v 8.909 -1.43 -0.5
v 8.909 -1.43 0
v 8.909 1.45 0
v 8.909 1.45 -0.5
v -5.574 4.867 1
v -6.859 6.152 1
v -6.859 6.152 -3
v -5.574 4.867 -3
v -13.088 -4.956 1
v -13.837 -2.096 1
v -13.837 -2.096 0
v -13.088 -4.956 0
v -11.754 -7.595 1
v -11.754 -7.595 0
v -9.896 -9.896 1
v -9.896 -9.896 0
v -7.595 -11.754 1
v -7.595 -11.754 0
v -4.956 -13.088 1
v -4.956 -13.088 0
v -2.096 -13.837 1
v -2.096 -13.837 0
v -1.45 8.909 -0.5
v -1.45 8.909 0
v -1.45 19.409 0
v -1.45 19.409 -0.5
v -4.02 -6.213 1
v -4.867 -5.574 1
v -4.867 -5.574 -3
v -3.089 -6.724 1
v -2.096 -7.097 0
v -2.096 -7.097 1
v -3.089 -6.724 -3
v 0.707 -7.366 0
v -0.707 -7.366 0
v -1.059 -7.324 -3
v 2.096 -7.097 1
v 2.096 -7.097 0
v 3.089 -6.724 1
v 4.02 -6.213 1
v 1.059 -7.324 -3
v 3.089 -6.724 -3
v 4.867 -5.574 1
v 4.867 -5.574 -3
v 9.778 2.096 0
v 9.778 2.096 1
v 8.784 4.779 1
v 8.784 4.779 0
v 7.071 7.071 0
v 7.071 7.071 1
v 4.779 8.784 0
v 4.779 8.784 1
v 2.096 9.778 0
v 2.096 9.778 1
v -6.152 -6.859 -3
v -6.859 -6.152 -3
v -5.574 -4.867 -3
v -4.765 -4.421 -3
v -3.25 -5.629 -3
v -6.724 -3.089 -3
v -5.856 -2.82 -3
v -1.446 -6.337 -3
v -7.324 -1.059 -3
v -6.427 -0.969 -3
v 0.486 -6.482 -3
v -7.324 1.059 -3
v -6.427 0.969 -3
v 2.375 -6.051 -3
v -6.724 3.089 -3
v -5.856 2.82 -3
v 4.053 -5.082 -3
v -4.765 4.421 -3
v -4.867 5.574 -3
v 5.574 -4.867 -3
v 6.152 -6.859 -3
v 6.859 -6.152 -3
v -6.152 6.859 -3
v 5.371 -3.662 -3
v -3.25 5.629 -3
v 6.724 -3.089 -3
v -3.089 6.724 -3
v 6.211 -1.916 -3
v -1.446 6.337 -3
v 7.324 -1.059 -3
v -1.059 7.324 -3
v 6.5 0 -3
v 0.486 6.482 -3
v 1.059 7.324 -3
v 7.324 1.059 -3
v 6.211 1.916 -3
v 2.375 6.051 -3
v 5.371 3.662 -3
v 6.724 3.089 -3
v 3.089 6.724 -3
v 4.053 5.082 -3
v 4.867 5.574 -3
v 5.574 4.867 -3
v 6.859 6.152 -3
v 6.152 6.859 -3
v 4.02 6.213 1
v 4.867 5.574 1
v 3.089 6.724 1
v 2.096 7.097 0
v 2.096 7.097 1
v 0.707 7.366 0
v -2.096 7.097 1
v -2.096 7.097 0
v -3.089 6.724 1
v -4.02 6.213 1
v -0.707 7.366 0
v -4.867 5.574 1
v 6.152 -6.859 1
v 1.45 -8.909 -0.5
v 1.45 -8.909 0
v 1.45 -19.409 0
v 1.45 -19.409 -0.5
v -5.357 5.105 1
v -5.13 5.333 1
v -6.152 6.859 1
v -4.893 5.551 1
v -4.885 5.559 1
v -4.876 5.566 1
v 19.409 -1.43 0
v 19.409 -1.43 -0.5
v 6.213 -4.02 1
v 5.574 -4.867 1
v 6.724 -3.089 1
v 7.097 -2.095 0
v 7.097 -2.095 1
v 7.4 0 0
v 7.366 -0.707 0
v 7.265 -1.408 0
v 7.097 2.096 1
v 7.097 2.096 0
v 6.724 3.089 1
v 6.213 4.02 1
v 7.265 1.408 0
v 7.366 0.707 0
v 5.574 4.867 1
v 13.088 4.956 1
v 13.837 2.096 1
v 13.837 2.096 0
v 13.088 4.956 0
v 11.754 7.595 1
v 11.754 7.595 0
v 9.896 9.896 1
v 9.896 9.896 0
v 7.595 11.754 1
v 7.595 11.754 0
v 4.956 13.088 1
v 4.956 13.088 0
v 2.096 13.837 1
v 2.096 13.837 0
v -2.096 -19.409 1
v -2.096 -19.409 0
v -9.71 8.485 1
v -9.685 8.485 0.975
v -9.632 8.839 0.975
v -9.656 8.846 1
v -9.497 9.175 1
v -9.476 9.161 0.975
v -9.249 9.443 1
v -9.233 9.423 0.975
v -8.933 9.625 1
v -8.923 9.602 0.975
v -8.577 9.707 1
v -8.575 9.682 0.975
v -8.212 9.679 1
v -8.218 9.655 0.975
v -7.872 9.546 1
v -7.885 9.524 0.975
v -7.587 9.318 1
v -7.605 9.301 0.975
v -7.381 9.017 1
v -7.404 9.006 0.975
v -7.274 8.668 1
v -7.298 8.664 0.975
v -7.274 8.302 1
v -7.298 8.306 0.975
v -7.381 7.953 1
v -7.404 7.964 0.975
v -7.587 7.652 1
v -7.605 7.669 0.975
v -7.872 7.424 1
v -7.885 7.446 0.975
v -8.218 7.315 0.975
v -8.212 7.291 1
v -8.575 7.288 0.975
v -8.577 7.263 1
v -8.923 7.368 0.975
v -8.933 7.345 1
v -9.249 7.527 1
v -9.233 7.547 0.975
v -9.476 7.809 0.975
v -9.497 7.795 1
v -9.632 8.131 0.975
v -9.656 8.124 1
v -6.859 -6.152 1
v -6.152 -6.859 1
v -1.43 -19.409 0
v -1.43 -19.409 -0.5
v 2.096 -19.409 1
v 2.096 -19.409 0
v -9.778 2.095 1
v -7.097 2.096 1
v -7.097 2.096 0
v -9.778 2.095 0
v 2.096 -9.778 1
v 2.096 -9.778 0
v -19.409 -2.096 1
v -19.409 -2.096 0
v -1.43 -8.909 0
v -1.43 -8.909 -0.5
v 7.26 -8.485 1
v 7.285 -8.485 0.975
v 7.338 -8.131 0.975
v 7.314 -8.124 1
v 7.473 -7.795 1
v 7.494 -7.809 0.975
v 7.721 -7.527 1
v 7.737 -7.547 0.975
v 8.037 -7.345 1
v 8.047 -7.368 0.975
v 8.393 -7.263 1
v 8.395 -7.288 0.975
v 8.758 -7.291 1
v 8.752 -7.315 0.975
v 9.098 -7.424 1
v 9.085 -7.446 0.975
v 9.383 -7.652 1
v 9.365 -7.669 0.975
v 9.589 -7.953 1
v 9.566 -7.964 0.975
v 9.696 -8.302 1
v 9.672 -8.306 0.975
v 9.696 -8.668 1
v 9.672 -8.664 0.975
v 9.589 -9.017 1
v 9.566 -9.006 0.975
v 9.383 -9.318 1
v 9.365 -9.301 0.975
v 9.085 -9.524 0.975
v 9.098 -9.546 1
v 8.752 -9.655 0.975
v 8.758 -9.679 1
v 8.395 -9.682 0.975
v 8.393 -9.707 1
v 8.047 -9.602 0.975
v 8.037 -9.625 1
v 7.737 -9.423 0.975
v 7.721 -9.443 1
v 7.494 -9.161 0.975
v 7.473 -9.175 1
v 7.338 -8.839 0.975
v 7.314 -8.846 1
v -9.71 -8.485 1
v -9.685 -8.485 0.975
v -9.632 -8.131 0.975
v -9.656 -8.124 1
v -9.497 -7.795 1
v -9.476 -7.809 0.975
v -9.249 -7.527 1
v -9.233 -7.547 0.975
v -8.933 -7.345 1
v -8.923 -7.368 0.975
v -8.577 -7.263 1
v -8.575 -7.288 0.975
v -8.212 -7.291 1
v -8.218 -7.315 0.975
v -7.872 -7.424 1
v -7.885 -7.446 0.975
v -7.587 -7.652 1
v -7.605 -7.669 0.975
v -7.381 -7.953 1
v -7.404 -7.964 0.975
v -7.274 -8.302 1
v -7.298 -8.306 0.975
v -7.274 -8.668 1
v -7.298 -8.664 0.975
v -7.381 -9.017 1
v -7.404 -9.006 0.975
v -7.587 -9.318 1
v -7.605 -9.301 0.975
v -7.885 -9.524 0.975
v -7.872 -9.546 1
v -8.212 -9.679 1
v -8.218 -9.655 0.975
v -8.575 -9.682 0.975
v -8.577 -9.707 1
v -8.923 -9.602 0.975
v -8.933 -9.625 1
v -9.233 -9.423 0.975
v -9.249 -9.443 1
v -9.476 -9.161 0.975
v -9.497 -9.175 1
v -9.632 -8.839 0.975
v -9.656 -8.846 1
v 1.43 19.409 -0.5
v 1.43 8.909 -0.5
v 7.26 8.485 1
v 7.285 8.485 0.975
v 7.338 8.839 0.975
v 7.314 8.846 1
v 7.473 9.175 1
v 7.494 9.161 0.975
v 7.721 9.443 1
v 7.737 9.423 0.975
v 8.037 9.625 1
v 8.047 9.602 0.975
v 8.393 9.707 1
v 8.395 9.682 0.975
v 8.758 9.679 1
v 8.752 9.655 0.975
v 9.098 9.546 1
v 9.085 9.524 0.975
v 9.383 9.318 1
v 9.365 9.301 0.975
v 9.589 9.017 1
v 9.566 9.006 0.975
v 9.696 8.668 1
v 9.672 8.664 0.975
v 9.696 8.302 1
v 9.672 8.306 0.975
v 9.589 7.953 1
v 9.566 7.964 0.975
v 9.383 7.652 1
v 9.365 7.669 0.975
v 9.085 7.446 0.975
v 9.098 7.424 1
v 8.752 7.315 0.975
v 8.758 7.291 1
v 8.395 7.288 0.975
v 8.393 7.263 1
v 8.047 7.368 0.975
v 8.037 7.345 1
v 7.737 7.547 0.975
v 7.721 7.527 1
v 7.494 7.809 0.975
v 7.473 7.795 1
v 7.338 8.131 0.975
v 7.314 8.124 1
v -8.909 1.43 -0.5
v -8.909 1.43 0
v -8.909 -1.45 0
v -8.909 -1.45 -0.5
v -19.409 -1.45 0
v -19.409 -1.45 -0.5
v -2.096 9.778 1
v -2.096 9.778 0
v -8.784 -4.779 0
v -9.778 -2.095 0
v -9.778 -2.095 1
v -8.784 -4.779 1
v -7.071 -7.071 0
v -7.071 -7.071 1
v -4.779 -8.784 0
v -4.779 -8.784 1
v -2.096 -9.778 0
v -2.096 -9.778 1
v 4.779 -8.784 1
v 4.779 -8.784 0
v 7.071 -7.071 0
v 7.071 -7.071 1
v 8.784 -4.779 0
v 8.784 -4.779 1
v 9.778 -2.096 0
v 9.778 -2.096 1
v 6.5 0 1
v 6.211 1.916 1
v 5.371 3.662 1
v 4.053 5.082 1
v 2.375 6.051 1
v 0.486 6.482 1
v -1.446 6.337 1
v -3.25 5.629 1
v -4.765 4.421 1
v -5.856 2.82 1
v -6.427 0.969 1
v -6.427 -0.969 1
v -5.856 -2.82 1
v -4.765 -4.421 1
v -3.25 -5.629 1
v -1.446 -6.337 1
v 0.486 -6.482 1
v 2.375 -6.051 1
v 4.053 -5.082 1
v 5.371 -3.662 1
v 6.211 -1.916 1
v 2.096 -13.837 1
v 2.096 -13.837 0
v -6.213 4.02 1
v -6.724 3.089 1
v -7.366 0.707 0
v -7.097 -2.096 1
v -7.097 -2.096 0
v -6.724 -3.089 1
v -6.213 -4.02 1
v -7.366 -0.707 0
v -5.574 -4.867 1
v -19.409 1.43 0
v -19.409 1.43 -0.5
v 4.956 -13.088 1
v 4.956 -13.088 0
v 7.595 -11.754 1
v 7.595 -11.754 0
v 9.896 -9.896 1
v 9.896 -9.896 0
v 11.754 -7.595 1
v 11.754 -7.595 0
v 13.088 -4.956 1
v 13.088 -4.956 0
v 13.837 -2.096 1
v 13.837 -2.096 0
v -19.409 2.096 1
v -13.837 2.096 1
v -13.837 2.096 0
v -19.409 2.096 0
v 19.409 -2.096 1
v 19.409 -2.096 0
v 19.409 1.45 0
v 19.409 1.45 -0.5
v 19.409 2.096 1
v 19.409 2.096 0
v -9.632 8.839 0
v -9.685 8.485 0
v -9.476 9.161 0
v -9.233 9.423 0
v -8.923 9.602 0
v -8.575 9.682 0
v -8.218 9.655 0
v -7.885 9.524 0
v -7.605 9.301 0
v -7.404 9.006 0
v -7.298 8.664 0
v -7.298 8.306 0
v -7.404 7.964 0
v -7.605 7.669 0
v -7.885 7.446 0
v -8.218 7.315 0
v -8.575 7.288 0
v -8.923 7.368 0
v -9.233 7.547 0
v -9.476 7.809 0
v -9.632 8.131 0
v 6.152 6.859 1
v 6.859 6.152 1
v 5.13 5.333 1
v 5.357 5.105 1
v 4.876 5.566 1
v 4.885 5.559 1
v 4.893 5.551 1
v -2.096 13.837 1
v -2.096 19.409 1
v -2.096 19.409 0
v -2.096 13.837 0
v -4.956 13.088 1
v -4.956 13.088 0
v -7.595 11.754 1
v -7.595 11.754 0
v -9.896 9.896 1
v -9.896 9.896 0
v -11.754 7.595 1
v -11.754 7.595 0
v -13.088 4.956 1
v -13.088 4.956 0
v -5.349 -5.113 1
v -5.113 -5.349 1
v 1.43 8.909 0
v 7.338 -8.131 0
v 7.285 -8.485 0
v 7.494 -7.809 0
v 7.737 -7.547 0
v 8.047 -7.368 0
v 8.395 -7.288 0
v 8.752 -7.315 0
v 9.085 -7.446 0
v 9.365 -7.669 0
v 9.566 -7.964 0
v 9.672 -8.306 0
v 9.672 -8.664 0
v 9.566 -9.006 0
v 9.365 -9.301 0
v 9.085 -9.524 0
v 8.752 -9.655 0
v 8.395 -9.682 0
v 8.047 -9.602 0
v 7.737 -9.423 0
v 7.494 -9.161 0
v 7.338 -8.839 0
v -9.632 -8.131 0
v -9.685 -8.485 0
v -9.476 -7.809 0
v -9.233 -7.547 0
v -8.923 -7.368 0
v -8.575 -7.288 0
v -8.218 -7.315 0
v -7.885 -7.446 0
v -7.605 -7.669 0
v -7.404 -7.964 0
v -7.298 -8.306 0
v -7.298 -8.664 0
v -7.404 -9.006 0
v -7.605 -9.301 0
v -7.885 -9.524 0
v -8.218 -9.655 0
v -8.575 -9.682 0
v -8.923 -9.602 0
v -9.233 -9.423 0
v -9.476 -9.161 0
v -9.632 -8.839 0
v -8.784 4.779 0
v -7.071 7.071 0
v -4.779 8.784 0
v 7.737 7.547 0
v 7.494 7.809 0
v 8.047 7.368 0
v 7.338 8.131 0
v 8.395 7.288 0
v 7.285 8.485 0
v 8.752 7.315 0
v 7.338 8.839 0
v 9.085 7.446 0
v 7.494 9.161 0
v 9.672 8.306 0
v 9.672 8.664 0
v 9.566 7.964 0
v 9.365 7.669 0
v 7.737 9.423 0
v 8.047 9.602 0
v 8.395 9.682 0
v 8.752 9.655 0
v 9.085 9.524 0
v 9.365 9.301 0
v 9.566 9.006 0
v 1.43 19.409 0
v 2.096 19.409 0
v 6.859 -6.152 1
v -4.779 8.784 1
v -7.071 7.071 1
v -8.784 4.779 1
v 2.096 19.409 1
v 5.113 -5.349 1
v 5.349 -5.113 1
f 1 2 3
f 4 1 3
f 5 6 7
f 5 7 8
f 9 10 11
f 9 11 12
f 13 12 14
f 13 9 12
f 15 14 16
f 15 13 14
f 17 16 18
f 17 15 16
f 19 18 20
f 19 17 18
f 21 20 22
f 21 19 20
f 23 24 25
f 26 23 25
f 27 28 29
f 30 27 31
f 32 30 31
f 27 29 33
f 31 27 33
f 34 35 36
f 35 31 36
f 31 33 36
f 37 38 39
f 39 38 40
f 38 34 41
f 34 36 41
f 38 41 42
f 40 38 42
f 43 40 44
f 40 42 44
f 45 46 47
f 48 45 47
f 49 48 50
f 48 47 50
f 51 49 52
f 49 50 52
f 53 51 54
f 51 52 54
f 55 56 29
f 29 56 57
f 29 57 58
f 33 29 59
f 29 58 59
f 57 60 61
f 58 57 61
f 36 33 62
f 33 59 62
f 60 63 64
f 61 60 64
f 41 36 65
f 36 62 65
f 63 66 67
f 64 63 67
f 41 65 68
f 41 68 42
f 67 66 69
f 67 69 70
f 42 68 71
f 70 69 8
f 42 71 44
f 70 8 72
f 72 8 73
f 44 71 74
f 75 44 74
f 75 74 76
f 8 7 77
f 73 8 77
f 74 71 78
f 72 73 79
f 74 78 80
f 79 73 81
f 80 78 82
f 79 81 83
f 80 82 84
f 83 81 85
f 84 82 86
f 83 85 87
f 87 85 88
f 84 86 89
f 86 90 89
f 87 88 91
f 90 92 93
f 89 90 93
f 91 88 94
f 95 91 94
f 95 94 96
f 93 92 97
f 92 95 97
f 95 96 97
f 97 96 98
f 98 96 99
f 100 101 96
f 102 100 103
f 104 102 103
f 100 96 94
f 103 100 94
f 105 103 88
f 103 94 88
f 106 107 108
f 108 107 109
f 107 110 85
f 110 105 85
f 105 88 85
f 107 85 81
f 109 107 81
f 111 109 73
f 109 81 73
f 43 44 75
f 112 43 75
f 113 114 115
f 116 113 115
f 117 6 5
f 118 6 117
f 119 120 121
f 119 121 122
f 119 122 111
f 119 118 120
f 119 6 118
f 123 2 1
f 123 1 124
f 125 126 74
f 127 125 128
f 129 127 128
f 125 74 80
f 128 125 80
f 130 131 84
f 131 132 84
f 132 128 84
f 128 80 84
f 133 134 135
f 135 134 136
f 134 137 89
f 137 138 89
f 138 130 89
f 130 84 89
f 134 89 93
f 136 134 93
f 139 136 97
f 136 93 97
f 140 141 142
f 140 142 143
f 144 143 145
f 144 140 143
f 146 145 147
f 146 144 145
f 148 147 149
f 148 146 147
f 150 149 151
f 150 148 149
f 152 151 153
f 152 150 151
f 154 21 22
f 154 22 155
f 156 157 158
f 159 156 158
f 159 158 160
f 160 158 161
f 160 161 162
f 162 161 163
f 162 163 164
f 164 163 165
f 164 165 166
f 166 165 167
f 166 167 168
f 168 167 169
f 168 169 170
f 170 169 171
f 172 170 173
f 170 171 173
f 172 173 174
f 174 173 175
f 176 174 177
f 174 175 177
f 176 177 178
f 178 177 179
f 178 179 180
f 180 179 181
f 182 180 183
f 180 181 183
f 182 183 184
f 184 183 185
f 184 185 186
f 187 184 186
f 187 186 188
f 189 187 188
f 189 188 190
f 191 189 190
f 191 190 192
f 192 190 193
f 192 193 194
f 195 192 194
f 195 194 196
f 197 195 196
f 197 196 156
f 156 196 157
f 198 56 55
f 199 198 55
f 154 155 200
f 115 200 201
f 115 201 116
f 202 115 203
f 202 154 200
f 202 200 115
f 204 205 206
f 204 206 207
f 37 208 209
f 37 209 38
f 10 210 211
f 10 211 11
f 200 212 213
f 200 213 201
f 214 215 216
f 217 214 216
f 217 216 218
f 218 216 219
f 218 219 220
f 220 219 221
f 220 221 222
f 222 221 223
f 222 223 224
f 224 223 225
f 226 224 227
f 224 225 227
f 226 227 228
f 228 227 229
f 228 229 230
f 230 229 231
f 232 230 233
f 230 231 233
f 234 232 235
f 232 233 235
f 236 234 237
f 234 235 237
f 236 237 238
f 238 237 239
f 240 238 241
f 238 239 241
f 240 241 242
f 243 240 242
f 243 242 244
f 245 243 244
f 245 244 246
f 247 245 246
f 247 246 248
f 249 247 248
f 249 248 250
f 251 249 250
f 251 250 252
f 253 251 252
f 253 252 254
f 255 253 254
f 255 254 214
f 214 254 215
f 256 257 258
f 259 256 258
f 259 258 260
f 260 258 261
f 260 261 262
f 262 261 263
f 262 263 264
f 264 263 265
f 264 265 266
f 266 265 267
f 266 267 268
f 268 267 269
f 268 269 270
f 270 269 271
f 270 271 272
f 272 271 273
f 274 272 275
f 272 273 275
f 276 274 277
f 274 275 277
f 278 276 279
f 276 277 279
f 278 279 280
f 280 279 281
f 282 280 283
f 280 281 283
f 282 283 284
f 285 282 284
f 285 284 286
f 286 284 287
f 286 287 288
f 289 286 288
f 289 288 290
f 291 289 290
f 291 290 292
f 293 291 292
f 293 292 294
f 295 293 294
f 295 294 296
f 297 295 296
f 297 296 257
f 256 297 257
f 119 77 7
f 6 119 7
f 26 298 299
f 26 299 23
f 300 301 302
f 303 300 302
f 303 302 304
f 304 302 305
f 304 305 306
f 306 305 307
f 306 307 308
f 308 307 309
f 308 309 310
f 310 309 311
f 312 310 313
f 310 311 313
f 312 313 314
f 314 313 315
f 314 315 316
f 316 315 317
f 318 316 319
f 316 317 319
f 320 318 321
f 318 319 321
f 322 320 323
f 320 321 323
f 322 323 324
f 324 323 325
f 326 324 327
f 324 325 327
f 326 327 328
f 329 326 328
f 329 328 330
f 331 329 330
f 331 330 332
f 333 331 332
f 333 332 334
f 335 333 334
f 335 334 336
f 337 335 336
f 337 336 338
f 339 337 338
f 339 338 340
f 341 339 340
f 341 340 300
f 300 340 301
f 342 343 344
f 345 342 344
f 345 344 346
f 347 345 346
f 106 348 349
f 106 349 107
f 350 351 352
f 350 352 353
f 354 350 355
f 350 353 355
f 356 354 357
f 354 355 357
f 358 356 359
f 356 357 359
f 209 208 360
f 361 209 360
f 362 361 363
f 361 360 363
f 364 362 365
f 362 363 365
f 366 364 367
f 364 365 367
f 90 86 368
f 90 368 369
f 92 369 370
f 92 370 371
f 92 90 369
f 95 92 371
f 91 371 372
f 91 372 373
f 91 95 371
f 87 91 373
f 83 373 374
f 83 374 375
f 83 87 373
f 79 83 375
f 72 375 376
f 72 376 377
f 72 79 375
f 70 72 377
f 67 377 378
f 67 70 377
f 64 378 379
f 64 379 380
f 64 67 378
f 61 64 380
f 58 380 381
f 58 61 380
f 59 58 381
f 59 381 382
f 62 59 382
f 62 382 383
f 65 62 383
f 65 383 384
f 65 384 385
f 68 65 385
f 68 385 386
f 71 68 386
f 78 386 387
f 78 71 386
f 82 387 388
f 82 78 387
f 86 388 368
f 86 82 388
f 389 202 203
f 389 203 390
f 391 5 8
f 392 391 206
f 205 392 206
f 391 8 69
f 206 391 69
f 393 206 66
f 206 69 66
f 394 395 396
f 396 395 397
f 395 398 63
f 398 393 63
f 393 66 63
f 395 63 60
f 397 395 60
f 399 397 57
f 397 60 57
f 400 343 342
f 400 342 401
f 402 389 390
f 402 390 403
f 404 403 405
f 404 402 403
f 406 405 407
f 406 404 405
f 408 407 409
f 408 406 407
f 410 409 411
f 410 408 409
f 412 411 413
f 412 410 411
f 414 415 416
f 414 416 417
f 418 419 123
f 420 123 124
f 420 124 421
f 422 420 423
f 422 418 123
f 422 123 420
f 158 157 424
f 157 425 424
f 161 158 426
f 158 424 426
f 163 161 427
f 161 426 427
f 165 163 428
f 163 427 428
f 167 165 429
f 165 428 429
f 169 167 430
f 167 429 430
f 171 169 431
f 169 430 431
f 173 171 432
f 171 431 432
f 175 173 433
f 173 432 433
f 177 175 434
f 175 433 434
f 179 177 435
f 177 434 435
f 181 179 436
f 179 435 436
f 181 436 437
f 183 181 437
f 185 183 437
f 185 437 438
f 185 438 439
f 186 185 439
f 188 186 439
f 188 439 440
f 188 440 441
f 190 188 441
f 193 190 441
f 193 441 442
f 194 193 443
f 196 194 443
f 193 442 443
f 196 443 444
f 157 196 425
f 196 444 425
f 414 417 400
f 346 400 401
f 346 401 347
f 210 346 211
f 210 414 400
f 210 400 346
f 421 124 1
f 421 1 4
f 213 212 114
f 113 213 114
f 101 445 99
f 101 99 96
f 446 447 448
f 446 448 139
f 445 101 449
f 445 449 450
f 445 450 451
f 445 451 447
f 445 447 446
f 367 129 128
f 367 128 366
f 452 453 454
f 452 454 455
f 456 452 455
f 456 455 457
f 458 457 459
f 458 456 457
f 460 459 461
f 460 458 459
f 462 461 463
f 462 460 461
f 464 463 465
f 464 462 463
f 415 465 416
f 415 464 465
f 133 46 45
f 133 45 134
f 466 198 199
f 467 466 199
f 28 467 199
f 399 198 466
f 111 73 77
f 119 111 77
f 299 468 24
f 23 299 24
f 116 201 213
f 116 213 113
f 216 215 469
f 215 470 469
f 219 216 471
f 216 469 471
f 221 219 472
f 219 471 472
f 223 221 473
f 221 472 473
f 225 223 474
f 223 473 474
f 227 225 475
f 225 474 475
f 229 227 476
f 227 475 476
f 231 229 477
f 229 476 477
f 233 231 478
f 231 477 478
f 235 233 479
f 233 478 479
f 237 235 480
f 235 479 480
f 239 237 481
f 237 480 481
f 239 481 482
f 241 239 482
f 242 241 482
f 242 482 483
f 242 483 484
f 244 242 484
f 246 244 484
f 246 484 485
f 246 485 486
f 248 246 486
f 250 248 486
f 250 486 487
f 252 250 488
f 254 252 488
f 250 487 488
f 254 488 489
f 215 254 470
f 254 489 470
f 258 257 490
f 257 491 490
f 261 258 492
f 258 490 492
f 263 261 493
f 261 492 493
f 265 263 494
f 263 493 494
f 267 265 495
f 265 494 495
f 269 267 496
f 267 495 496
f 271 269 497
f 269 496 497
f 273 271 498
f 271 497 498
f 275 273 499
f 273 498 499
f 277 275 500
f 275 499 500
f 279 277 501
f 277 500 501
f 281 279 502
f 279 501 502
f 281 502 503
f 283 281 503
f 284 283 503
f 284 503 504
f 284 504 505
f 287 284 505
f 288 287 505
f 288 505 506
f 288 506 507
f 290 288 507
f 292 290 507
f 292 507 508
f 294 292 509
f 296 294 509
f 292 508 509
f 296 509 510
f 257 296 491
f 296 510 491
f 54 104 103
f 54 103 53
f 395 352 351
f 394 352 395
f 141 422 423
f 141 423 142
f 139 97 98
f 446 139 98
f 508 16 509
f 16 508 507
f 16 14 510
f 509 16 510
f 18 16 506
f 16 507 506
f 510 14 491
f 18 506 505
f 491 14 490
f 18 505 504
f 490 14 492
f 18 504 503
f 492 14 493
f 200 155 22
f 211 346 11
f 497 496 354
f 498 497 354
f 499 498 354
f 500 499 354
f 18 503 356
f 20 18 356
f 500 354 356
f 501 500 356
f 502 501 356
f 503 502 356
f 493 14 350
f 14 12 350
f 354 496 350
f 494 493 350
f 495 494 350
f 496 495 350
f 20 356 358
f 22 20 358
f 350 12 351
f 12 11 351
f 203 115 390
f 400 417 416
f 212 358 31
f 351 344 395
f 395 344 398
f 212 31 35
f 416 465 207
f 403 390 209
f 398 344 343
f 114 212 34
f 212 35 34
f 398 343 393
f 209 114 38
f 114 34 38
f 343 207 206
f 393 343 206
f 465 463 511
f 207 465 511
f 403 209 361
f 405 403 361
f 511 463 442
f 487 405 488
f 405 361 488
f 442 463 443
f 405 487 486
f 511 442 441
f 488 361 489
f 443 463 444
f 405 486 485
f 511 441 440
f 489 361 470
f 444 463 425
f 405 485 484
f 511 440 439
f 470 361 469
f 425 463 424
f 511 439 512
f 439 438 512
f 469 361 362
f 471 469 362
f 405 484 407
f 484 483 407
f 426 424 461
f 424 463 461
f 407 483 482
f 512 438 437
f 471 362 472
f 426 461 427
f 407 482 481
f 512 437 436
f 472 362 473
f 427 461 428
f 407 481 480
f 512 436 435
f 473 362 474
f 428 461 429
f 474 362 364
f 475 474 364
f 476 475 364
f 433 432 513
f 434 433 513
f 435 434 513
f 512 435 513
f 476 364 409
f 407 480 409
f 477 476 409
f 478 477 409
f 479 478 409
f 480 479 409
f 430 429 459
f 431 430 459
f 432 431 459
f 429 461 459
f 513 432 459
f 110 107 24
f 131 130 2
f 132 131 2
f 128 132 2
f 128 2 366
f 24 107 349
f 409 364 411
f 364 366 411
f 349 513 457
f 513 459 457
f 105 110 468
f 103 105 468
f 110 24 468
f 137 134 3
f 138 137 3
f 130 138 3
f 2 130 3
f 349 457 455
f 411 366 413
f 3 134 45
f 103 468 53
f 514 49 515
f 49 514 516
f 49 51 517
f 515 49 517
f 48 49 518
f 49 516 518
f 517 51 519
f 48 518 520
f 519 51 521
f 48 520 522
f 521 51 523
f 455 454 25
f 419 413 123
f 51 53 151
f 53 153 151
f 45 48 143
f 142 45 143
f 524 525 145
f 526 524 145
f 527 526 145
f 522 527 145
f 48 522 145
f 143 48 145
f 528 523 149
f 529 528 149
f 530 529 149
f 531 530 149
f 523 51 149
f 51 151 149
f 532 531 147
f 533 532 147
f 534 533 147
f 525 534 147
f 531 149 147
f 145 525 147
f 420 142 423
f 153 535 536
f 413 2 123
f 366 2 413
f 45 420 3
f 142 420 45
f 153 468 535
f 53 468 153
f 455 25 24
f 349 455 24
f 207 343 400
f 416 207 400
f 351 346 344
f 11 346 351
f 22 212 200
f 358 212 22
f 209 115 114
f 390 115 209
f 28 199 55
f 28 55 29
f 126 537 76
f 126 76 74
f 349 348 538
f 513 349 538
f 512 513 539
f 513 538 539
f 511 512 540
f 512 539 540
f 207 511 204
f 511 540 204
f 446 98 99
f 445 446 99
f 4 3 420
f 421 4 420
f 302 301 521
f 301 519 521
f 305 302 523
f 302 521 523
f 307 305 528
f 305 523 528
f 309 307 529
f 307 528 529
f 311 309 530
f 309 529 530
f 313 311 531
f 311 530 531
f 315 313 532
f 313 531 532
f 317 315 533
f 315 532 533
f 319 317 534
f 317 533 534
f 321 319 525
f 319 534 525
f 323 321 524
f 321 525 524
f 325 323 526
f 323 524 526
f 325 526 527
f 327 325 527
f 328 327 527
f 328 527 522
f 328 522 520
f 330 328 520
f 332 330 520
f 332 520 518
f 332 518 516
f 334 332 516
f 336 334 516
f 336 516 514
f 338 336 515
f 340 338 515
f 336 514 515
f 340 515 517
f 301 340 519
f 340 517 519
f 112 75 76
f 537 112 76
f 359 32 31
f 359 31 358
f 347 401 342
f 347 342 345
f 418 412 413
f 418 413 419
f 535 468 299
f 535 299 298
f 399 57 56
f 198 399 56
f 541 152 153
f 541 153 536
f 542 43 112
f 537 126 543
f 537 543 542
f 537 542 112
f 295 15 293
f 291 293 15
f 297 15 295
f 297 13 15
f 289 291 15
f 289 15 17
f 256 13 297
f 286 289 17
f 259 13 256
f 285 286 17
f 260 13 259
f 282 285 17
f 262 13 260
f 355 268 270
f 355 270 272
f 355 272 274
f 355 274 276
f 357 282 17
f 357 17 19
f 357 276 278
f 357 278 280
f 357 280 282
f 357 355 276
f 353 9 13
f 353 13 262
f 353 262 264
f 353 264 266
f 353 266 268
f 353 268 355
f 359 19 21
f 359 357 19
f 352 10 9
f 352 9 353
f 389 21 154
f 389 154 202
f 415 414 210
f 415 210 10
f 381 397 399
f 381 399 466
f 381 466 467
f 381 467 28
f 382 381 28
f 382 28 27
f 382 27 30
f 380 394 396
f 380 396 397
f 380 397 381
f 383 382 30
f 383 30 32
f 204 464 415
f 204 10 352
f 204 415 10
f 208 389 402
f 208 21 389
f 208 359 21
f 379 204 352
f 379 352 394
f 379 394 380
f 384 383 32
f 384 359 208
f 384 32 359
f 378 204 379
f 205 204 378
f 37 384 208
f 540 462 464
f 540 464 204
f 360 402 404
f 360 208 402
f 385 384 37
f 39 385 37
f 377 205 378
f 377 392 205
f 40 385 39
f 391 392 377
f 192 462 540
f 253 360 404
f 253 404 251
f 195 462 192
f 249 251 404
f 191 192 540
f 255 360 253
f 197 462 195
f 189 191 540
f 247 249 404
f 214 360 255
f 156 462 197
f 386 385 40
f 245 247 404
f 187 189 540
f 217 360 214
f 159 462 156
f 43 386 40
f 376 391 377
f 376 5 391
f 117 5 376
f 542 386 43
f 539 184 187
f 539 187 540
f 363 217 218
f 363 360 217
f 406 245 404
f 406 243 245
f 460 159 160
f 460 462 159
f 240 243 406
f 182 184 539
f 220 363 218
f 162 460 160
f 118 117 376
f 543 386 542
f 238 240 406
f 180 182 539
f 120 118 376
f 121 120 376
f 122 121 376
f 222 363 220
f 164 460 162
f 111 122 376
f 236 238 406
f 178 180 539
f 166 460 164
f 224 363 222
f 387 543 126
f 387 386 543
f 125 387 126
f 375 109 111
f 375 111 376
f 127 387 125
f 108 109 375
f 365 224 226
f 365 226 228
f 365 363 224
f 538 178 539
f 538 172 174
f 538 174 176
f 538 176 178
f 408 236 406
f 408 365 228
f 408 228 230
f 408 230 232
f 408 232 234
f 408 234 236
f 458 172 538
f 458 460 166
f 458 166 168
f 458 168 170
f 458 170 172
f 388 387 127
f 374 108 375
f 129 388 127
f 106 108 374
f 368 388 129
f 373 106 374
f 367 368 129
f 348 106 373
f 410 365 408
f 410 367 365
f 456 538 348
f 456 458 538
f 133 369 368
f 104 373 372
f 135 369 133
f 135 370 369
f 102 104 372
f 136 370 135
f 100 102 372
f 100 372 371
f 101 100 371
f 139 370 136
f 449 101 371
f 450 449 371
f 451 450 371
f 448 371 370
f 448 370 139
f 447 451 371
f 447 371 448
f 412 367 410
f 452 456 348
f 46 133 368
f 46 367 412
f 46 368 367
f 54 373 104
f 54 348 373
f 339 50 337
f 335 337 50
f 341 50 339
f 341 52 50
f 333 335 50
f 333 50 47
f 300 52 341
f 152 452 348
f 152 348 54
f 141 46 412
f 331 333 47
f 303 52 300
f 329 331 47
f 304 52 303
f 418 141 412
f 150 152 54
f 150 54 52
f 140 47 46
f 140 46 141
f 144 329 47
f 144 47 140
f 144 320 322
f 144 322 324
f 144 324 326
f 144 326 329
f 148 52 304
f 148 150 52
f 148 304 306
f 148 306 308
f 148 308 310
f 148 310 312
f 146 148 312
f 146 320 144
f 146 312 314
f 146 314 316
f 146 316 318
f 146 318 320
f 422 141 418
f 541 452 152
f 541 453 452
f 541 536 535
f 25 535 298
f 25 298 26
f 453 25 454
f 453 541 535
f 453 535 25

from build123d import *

# Parameters (mm, degrees)
BOSS_EXTRUDE1_DEPTH            = 1.0000005
BOSS_EXTRUDE1_DEPTH_BACK       = 3
SKETCH1_R                      = 7.4
SKETCH1_R_2                    = 6.5
BOSS_EXTRUDE2_DEPTH            = 1.0000005
BOSS_EXTRUDE12_START           = -3
BOSS_EXTRUDE12_DEPTH           = 4.000001
SKETCH6_W                      = 2.880295876
SKETCH6_H                      = 10.5
BOSS_EXTRUDE8_DEPTH            = 0.5
CIRPATTERN3_COUNT              = 4
SKETCH7_R                      = 14
SKETCH7_R_2                    = 10
BOSS_EXTRUDE10_DEPTH           = 1.0000005
M2_CLEARANCE_HOLE1_D           = 2.4
M2_CLEARANCE_HOLE1_CSINK_D     = 2.45
M2_CLEARANCE_HOLE1_CSINK_ANGLE = 90
CUT_EXTRUDE1_DEPTH             = 28.738141627


with BuildPart() as part:
    # Sketch1 → Boss-Extrude1 (new, two sides: drawn at the far end of the back side and taken through both)
    with BuildSketch(Plane.XY.offset(-BOSS_EXTRUDE1_DEPTH_BACK)):
        Circle(SKETCH1_R)
        Circle(SKETCH1_R_2, mode=Mode.SUBTRACT)
    extrude(amount=BOSS_EXTRUDE1_DEPTH + BOSS_EXTRUDE1_DEPTH_BACK)

    # Sketch2 → Boss-Extrude2 (add)
    with BuildSketch(Plane.XY.offset(1.0000005)):
        with BuildLine():
            ThreePointArc((2.0955, -15.598818832), (6.979767945, -14.106633498), (11.129112031, -11.129112031))
            ThreePointArc((11.129112031, -11.129112031), (14.106633498, -6.979767945), (15.598818832, -2.0955))
            Line((15.598818832, -2.0955), (19.408818832, -2.0955))
            Line((19.408818832, -2.0955), (19.408818832, 2.0955))
            Line((19.408818832, 2.0955), (15.598818832, 2.0955))
            ThreePointArc((15.598818832, 2.0955), (11.129112031, 11.129112031), (2.0955, 15.598818832))
            Line((2.0955, 15.598818832), (2.0955, 19.408818832))
            Line((2.0955, 19.408818832), (-2.0955, 19.408818832))
            Line((-2.0955, 19.408818832), (-2.0955, 15.598818832))
            ThreePointArc((-2.0955, 15.598818832), (-11.129112031, 11.129112031), (-15.598818832, 2.0955))
            Line((-15.598818832, 2.0955), (-19.408818832, 2.0955))
            Line((-19.408818832, 2.0955), (-19.408818832, -2.0955))
            Line((-19.408818832, -2.0955), (-15.598818832, -2.0955))
            ThreePointArc((-15.598818832, -2.0955), (-11.129112031, -11.129112031), (-2.0955, -15.598818832))
            Line((-2.0955, -15.598818832), (-2.0955, -19.408818832))
            Line((-2.0955, -19.408818832), (2.0955, -19.408818832))
            Line((2.0955, -19.408818832), (2.0955, -15.598818832))
        make_face()
        with BuildLine():
            ThreePointArc((7.4, 0), (7.323884446, -1.05863904), (7.097103617, -2.0955))
            Line((7.097103617, -2.0955), (13.031535896, -2.0955))
            ThreePointArc((13.031535896, -2.0955), (11.753270525, -6.006053615), (9.333060807, -9.333060807))
            ThreePointArc((9.333060807, -9.333060807), (6.006053615, -11.753270525), (2.0955, -13.031535896))
            Line((2.0955, -13.031535896), (2.0955, -7.097103617))
            ThreePointArc((2.0955, -7.097103617), (0, -7.4), (-2.0955, -7.097103617))
            Line((-2.0955, -7.097103617), (-2.0955, -13.031535896))
            ThreePointArc((-2.0955, -13.031535896), (-9.333060807, -9.333060807), (-13.031535896, -2.0955))
            Line((-13.031535896, -2.0955), (-7.097103617, -2.0955))
            ThreePointArc((-7.097103617, -2.0955), (-7.4, 0), (-7.097103617, 2.0955))
            Line((-7.097103617, 2.0955), (-13.031535896, 2.0955))
            ThreePointArc((-13.031535896, 2.0955), (-9.333060807, 9.333060807), (-2.0955, 13.031535896))
            Line((-2.0955, 13.031535896), (-2.0955, 7.097103617))
            ThreePointArc((-2.0955, 7.097103617), (0, 7.4), (2.0955, 7.097103617))
            Line((2.0955, 7.097103617), (2.0955, 13.031535896))
            ThreePointArc((2.0955, 13.031535896), (9.333060807, 9.333060807), (13.031535896, 2.0955))
            Line((13.031535896, 2.0955), (7.097103617, 2.0955))
            ThreePointArc((7.097103617, 2.0955), (7.323884446, 1.05863904), (7.4, 0))
        make_face(mode=Mode.SUBTRACT)
    extrude(amount=-BOSS_EXTRUDE2_DEPTH)

    # Sketch3 → Boss-Extrude12 (add)
    with BuildSketch(Plane.XY.offset(BOSS_EXTRUDE12_START)):
        with BuildLine():
            ThreePointArc((4.867078755, 5.574185536), (4.880275394, 5.562635354), (4.893444623, 5.551053929))
            ThreePointArc((4.893444623, 5.551053929), (5.244976244, 5.220174729), (5.574185536, 4.867078755))
            Line((5.574185536, 4.867078755), (6.858935778, 6.151828996))
            Line((6.858935778, 6.151828996), (6.151828996, 6.858935778))
            Line((6.151828996, 6.858935778), (4.867078755, 5.574185536))
        make_face()
        with BuildLine():
            ThreePointArc((-4.893444623, 5.551053929), (-4.880275394, 5.562635354), (-4.867078755, 5.574185536))
            Line((-4.867078755, 5.574185536), (-6.151828996, 6.858935778))
            Line((-6.151828996, 6.858935778), (-6.858935778, 6.151828996))
            Line((-6.858935778, 6.151828996), (-5.574185536, 4.867078755))
            ThreePointArc((-5.574185536, 4.867078755), (-5.244976244, 5.220174729), (-4.893444623, 5.551053929))
        make_face()
        with BuildLine():
            Line((6.858935778, -6.151828996), (5.574185536, -4.867078755))
            ThreePointArc((5.574185536, -4.867078755), (5.232590181, -5.232590181), (4.867078755, -5.574185536))
            Line((4.867078755, -5.574185536), (6.151828996, -6.858935778))
            Line((6.151828996, -6.858935778), (6.858935778, -6.151828996))
        make_face()
        with BuildLine():
            ThreePointArc((-4.867078755, -5.574185536), (-5.232590181, -5.232590181), (-5.574185536, -4.867078755))
            Line((-5.574185536, -4.867078755), (-6.858935778, -6.151828996))
            Line((-6.858935778, -6.151828996), (-6.151828996, -6.858935778))
            Line((-6.151828996, -6.858935778), (-4.867078755, -5.574185536))
        make_face()
    extrude(amount=BOSS_EXTRUDE12_DEPTH)

    # Sketch6 → Boss-Extrude8 (add)
    with BuildSketch(Plane(origin=(0, 0, 0), x_dir=(-1, 0, 0), z_dir=(0, 0, -1))):
        with Locations((0.009852062, 14.158818832)):
            Rectangle(SKETCH6_W, SKETCH6_H)
    boss_extrude8 = extrude(amount=BOSS_EXTRUDE8_DEPTH)

    # CirPattern3: Boss-Extrude8 ×4 about axis
    cirpattern3_axis = Axis((0, 0, 0), (0, 0, 1))
    for i in range(1, CIRPATTERN3_COUNT):
        add(boss_extrude8.rotate(cirpattern3_axis, i * 360 / CIRPATTERN3_COUNT))

    # Sketch7 → Boss-Extrude10 (add)
    with BuildSketch(Plane.XY.offset(1.0000005)):
        Circle(SKETCH7_R)
        Circle(SKETCH7_R_2, mode=Mode.SUBTRACT)
    extrude(amount=-BOSS_EXTRUDE10_DEPTH)

    # M2 Clearance Hole1 (through all)
    with Locations(Plane.XY.offset(1.0000005)):
        with Locations((0, 0), (8.485, -8.485), (-8.485, 8.485), (-8.485, -8.485), (8.485, 8.485)):
            CounterSinkHole(M2_CLEARANCE_HOLE1_D / 2, M2_CLEARANCE_HOLE1_CSINK_D / 2, counter_sink_angle=M2_CLEARANCE_HOLE1_CSINK_ANGLE)

    # Sketch10 → Cut-Extrude1 (cut, through all)
    with BuildSketch(Plane.XY.offset(1.0000005)):
        with BuildLine():
            ThreePointArc((-2.0955, 13.83682648), (-9.895678028, 9.895678028), (-13.83682648, 2.0955))
            Line((-13.83682648, 2.0955), (-20.600743229, 2.0955))
            ThreePointArc((-20.600743229, 2.0955), (-14.335944494, 14.286228168), (-2.0955, 20.453324327))
            Line((-2.0955, 20.453324327), (-2.0955, 13.83682648))
        make_face()
        with BuildLine():
            ThreePointArc((13.83682648, 2.0955), (9.895678028, 9.895678028), (2.0955, 13.83682648))
            Line((2.0955, 13.83682648), (2.0955, 20.453324327))
            ThreePointArc((2.0955, 20.453324327), (15.477172624, 15.2424301), (21.254785436, 2.0955))
            Line((21.254785436, 2.0955), (13.83682648, 2.0955))
        make_face()
        with BuildLine():
            ThreePointArc((-2.0955, -21.163548472), (-15.297243757, -15.462085596), (-20.600743229, -2.0955))
            Line((-20.600743229, -2.0955), (-13.83682648, -2.0955))
            ThreePointArc((-13.83682648, -2.0955), (-9.895678028, -9.895678028), (-2.0955, -13.83682648))
            Line((-2.0955, -13.83682648), (-2.0955, -21.163548472))
        make_face()
        with BuildLine():
            ThreePointArc((2.0955, -13.83682648), (9.895678028, -9.895678028), (13.83682648, -2.0955))
            Line((13.83682648, -2.0955), (21.254785436, -2.0955))
            ThreePointArc((21.254785436, -2.0955), (15.624264861, -15.597542172), (2.0955, -21.163548472))
            Line((2.0955, -21.163548472), (2.0955, -13.83682648))
        make_face()
    extrude(amount=-CUT_EXTRUDE1_DEPTH, mode=Mode.SUBTRACT)


solid = part.part
